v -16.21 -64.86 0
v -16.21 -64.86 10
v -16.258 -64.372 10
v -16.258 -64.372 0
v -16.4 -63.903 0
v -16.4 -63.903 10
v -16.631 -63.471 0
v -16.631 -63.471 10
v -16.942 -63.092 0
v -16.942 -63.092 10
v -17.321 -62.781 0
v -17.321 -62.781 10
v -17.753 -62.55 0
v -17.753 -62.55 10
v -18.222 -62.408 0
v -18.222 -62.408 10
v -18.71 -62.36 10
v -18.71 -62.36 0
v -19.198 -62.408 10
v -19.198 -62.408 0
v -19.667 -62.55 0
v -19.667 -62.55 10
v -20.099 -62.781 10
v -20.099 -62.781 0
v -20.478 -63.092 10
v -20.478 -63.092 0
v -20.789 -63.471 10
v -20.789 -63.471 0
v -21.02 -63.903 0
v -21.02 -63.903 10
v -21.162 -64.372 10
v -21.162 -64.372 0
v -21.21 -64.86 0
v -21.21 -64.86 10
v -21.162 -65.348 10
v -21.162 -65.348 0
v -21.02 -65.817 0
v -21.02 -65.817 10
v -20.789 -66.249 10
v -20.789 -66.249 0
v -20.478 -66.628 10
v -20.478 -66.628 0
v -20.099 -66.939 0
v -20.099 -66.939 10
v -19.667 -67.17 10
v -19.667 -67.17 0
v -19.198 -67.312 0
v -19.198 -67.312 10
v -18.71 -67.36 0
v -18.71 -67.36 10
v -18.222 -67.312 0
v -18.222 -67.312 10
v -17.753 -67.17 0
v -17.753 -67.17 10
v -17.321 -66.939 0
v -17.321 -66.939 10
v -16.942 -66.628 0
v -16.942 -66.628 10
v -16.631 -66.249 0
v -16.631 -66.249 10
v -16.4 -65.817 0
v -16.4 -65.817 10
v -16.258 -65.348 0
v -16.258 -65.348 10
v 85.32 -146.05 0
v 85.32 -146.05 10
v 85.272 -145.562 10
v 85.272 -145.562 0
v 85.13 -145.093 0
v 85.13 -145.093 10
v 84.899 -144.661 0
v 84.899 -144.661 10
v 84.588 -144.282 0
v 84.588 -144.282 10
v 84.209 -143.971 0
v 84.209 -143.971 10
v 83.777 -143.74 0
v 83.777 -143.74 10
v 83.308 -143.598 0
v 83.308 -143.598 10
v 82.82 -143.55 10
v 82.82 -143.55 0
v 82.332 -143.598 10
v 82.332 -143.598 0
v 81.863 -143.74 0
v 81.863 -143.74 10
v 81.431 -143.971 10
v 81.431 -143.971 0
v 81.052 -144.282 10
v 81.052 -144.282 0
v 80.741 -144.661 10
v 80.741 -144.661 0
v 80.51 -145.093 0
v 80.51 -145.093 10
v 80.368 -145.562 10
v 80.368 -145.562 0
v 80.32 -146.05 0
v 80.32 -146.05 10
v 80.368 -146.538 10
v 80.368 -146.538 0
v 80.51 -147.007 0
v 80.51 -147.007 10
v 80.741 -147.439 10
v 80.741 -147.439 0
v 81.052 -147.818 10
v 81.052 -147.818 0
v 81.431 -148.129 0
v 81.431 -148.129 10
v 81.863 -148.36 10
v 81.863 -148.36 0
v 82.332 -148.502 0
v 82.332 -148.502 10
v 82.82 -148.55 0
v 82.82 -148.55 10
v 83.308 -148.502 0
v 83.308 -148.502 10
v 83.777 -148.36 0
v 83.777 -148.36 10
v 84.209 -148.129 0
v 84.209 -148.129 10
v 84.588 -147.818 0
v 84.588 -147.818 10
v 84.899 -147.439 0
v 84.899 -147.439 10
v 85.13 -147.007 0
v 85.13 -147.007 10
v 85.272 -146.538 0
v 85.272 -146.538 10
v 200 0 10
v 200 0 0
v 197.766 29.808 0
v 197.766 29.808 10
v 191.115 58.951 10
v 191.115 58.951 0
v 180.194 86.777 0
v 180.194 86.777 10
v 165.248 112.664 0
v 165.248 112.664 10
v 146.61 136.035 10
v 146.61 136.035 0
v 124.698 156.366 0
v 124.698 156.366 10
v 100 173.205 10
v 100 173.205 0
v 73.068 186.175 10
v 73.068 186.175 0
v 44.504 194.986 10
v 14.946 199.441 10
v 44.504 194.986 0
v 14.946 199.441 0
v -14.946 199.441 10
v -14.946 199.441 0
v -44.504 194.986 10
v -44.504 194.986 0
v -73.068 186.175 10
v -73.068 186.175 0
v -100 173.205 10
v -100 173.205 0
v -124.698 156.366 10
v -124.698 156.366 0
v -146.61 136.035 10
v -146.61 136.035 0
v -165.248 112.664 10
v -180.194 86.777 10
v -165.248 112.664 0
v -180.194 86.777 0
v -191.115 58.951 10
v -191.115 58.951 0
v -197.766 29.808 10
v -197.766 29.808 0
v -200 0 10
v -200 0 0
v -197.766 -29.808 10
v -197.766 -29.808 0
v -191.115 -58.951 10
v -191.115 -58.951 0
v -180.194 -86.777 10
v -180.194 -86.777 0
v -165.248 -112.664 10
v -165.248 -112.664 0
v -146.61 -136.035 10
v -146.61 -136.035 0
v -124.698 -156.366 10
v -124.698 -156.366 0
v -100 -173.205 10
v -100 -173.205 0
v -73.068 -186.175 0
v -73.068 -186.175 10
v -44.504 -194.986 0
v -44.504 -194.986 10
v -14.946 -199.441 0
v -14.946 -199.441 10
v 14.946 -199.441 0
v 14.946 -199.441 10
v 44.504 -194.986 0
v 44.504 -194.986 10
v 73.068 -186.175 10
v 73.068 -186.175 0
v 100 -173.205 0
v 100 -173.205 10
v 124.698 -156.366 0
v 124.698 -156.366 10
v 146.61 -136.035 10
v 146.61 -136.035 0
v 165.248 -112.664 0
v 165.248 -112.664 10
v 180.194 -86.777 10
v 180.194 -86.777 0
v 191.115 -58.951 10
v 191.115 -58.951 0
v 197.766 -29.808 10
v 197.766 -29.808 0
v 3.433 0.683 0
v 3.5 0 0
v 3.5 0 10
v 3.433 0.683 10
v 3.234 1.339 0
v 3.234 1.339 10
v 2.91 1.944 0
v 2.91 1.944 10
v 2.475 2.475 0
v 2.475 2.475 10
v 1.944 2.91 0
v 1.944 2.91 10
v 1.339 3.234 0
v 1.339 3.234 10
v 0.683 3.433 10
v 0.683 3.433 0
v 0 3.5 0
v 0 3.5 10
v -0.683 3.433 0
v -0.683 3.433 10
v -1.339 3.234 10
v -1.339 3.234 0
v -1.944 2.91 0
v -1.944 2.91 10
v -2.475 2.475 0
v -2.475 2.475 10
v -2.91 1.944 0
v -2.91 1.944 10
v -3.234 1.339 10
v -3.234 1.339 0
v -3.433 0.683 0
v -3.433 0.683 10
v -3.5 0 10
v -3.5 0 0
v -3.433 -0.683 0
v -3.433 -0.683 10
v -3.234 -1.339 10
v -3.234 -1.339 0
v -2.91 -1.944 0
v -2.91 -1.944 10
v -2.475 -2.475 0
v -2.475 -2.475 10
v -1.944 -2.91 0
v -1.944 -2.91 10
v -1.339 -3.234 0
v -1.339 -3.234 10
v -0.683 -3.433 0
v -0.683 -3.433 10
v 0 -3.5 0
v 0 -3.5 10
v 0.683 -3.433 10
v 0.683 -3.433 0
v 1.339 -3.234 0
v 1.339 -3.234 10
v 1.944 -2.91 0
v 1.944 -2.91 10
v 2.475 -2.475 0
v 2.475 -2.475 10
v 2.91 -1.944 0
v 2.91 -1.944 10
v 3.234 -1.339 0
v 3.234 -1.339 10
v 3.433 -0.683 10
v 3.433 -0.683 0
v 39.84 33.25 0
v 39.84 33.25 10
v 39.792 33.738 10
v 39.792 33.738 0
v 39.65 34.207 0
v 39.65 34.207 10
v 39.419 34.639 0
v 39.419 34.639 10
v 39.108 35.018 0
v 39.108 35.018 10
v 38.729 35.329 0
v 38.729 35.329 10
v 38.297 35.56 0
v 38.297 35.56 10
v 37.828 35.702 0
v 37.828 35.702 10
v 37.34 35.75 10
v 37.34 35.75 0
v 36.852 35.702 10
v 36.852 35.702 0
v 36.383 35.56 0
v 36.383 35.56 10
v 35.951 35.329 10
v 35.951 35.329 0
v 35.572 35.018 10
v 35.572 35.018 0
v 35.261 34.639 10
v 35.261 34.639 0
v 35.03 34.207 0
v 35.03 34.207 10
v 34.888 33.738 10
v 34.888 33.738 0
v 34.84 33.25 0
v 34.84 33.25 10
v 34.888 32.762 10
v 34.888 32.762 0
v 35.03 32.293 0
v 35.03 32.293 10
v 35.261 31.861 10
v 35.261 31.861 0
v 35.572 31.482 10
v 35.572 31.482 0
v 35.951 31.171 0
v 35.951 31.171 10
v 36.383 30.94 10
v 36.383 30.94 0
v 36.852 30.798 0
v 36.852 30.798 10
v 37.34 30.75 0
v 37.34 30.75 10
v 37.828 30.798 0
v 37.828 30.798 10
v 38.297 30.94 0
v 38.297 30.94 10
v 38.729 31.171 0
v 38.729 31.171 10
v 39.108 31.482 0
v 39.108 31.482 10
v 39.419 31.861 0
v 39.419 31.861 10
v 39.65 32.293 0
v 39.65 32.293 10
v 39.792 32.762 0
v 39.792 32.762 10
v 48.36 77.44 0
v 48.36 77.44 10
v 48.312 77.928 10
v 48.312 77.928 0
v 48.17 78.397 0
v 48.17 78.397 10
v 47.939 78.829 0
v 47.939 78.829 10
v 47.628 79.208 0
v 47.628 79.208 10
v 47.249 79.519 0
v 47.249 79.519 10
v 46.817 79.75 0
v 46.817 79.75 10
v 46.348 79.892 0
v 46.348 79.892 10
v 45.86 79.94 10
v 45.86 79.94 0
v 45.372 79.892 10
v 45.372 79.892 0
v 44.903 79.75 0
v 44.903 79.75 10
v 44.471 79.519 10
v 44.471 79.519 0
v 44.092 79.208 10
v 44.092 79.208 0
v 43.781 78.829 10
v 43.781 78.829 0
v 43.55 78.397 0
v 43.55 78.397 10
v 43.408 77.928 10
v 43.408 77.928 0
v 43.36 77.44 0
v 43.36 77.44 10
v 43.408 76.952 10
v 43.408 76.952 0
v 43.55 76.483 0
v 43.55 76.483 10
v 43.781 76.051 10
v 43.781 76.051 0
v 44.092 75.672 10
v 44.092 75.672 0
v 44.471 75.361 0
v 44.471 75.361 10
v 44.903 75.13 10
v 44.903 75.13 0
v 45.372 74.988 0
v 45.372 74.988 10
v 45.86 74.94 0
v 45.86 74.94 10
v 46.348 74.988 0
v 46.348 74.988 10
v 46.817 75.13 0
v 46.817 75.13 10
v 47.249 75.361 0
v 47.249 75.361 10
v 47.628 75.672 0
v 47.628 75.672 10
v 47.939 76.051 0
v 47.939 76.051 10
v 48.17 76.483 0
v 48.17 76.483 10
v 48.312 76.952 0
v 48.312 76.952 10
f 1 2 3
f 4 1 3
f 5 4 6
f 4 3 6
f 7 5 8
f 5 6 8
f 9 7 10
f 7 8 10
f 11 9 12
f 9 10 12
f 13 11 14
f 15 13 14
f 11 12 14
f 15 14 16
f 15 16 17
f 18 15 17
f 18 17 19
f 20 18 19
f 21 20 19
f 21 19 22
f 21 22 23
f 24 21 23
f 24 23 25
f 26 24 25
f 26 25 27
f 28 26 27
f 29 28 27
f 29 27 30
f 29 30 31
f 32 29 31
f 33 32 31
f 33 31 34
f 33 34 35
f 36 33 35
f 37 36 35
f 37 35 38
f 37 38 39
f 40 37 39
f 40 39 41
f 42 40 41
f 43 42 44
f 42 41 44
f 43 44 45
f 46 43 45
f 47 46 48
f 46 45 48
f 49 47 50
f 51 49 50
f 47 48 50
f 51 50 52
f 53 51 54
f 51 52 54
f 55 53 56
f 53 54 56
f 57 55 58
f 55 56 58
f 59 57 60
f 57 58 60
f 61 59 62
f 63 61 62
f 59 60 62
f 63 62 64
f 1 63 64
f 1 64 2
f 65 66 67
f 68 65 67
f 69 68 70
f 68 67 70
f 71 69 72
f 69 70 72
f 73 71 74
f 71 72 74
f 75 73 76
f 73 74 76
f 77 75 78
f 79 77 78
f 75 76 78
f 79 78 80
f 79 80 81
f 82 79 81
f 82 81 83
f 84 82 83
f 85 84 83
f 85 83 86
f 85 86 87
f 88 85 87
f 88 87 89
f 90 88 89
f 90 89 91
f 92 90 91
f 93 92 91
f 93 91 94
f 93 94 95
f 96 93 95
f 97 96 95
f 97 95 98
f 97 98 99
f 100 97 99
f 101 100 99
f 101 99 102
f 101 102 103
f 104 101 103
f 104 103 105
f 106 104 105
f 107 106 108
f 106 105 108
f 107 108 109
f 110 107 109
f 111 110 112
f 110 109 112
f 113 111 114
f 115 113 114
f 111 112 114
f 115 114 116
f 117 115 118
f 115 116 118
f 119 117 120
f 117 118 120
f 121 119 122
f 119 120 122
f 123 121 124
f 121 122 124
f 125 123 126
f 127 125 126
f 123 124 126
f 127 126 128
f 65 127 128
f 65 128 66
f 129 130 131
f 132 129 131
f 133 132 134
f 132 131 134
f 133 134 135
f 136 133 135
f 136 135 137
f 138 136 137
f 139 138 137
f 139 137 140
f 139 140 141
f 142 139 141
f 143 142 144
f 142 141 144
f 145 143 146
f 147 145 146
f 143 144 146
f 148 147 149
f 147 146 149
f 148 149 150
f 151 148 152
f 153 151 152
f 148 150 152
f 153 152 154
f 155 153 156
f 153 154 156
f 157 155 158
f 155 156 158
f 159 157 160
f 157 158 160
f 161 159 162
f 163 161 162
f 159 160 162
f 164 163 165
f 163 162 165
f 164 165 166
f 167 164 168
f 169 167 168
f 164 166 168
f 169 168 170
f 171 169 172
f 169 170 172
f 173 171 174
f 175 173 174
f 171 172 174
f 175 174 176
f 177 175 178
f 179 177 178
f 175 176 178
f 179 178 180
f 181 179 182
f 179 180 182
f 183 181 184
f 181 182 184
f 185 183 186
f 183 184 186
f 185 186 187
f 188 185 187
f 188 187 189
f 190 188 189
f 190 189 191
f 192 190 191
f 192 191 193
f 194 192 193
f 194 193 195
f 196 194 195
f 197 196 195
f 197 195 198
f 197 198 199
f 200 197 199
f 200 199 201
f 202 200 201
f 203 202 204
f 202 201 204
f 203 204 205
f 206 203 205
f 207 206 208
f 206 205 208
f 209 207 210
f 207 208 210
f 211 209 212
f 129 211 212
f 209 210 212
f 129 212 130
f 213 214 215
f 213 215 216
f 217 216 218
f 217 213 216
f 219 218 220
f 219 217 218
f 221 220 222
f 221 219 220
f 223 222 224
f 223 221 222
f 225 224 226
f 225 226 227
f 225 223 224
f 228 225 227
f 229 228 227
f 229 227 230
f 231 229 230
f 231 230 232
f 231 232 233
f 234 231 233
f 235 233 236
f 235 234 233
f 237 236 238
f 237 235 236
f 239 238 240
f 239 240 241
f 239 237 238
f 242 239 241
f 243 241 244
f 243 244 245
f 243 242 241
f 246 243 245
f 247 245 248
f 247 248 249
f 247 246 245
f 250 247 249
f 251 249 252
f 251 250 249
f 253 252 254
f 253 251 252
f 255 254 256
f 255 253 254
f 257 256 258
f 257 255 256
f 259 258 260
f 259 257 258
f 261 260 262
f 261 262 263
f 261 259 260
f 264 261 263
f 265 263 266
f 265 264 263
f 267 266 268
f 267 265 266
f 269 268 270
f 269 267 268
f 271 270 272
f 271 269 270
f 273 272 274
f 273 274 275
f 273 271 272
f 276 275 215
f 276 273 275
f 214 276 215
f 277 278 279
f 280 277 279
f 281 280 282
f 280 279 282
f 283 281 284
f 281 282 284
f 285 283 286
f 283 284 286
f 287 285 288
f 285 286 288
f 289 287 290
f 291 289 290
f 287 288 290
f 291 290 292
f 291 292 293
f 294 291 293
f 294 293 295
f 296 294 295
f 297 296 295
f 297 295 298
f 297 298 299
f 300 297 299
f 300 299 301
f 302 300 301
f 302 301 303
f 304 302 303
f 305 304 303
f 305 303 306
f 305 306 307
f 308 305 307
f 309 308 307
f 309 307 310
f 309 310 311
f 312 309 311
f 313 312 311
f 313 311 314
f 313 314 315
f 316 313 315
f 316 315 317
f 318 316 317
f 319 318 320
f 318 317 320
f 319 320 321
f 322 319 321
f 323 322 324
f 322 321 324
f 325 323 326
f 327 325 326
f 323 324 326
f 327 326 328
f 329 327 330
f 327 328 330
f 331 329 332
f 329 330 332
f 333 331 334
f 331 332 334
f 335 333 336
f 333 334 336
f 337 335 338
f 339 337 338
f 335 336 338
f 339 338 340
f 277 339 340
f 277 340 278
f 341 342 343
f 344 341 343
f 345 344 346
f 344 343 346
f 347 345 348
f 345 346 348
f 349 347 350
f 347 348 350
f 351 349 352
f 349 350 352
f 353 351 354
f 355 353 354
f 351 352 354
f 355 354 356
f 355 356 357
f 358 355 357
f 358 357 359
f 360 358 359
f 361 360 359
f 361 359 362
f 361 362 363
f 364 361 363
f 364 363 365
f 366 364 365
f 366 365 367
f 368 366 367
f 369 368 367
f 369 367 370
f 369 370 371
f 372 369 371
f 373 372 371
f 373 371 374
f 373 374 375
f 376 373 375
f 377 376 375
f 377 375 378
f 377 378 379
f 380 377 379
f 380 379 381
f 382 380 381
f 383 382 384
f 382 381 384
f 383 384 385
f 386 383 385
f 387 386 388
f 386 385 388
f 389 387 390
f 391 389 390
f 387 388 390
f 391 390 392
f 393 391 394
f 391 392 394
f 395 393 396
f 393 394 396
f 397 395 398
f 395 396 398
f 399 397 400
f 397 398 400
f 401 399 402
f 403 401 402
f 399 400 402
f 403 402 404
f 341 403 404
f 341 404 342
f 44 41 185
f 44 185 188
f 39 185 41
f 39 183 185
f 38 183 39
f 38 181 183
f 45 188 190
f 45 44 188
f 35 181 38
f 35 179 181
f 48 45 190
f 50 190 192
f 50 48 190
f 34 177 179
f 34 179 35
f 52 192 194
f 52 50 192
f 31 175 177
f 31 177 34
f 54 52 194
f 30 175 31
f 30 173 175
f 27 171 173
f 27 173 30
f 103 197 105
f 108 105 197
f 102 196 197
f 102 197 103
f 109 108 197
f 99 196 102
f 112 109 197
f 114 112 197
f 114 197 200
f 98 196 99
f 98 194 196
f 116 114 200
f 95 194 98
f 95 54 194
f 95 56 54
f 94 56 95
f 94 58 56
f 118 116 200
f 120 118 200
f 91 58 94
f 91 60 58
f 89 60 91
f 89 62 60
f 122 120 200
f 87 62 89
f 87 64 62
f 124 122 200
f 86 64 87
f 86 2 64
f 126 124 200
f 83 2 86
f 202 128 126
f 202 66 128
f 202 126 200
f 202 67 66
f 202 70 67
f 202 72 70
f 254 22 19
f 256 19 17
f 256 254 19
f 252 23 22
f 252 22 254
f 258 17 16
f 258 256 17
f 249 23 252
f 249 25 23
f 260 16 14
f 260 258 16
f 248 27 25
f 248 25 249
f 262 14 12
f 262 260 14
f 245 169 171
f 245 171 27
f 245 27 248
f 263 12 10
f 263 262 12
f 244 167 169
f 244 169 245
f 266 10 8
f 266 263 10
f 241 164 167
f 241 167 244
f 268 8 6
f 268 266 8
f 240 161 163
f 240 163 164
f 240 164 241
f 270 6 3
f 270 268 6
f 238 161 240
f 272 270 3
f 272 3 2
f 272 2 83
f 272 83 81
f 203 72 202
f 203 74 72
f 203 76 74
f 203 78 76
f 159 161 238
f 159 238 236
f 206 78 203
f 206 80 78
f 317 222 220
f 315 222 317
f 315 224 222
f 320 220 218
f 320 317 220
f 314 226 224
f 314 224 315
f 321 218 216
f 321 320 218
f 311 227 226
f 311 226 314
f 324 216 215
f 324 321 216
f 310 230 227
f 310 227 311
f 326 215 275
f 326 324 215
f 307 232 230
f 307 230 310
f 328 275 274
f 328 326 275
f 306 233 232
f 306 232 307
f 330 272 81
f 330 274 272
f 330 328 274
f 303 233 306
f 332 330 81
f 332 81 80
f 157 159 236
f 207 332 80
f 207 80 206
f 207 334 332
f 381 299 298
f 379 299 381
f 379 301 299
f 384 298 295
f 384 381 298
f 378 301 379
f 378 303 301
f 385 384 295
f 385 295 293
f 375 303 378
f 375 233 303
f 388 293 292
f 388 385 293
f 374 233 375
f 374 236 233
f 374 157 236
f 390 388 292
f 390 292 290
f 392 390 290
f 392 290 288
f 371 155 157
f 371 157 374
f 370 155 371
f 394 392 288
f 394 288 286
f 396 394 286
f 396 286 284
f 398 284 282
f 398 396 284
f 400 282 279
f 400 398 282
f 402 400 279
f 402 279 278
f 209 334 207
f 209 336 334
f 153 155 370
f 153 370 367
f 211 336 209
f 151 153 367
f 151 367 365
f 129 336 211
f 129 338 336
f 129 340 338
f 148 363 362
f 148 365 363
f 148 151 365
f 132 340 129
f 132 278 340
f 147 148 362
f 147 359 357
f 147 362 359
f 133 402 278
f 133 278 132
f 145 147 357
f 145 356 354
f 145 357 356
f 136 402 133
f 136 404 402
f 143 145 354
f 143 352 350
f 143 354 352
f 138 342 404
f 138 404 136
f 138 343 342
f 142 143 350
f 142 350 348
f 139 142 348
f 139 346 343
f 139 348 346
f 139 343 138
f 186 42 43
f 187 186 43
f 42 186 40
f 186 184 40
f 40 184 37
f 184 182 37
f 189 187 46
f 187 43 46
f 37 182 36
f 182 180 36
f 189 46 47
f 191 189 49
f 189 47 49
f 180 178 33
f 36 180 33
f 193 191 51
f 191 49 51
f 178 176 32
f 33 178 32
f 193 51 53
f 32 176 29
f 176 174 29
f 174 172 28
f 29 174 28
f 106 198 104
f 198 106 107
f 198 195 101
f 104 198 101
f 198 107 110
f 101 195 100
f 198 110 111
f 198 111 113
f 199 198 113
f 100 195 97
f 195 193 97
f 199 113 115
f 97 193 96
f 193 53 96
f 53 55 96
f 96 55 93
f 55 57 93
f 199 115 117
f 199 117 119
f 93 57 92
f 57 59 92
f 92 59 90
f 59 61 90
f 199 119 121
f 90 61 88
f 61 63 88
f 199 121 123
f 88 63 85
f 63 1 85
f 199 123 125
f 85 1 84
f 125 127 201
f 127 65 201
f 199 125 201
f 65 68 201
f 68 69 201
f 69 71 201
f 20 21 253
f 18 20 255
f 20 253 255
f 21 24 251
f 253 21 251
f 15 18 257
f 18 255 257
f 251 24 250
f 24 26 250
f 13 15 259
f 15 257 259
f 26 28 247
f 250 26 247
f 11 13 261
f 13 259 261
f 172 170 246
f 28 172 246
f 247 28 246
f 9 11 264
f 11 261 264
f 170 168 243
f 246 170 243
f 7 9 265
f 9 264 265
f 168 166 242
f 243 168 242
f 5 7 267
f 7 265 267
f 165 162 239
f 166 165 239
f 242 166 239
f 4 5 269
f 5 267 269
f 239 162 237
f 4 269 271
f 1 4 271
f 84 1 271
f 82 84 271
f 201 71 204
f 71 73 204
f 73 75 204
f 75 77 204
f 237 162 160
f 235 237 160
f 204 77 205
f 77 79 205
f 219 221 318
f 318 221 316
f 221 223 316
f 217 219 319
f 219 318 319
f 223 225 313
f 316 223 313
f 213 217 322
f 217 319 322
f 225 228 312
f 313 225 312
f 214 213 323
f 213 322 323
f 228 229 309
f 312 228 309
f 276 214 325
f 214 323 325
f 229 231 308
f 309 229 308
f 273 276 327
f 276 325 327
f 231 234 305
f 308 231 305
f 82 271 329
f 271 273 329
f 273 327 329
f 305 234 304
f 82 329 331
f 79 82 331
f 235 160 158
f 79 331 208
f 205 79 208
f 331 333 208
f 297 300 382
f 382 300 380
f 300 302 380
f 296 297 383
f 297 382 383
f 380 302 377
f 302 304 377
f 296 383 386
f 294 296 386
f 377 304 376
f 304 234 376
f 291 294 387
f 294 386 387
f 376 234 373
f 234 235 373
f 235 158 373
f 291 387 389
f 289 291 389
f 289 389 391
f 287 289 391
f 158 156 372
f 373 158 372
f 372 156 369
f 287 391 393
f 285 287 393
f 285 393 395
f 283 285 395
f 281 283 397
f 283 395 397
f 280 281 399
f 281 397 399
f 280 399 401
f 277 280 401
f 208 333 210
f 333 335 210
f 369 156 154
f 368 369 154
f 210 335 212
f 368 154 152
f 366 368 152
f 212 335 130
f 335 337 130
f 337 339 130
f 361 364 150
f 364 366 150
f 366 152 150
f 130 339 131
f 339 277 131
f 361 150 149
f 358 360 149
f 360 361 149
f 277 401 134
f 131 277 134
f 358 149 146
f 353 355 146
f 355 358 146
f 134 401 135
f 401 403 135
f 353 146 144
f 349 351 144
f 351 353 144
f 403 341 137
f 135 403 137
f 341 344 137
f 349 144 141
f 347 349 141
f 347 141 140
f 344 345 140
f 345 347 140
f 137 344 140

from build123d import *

# Parameters (mm, degrees)
SKETCH1_R           = 200
SKETCH1_R_2         = 3.5
BOSS_EXTRUDE1_DEPTH = 10
SKETCH2_R           = 2.5
CUT_EXTRUDE1_DEPTH  = 11
SKETCH3_R           = 2.5
CUT_EXTRUDE2_DEPTH  = 11
SKETCH4_R           = 2.5
CUT_EXTRUDE3_DEPTH  = 11


with BuildPart() as part:
    # Sketch1 → Boss-Extrude1 (new body)
    with BuildSketch(Plane.XY):
        Circle(SKETCH1_R)
        Circle(SKETCH1_R_2, mode=Mode.SUBTRACT)
    extrude(amount=BOSS_EXTRUDE1_DEPTH)

    # Sketch2 → Cut-Extrude1 (cut, through all)
    with BuildSketch(Plane.XY.offset(10)):
        with Locations((37.34, 33.25)):
            Circle(SKETCH2_R)
        with Locations((45.86, 77.44)):
            Circle(SKETCH2_R)
    extrude(amount=-CUT_EXTRUDE1_DEPTH, mode=Mode.SUBTRACT)

    # Sketch3 → Cut-Extrude2 (cut, through all)
    with BuildSketch(Plane.XY.offset(10)):
        with Locations((-18.71, -64.86)):
            Circle(SKETCH3_R)
    extrude(amount=-CUT_EXTRUDE2_DEPTH, mode=Mode.SUBTRACT)

    # Sketch4 → Cut-Extrude3 (cut, through all)
    with BuildSketch(Plane.XY.offset(10)):
        with Locations((82.82, -146.05)):
            Circle(SKETCH4_R)
    extrude(amount=-CUT_EXTRUDE3_DEPTH, mode=Mode.SUBTRACT)


solid = part.part
